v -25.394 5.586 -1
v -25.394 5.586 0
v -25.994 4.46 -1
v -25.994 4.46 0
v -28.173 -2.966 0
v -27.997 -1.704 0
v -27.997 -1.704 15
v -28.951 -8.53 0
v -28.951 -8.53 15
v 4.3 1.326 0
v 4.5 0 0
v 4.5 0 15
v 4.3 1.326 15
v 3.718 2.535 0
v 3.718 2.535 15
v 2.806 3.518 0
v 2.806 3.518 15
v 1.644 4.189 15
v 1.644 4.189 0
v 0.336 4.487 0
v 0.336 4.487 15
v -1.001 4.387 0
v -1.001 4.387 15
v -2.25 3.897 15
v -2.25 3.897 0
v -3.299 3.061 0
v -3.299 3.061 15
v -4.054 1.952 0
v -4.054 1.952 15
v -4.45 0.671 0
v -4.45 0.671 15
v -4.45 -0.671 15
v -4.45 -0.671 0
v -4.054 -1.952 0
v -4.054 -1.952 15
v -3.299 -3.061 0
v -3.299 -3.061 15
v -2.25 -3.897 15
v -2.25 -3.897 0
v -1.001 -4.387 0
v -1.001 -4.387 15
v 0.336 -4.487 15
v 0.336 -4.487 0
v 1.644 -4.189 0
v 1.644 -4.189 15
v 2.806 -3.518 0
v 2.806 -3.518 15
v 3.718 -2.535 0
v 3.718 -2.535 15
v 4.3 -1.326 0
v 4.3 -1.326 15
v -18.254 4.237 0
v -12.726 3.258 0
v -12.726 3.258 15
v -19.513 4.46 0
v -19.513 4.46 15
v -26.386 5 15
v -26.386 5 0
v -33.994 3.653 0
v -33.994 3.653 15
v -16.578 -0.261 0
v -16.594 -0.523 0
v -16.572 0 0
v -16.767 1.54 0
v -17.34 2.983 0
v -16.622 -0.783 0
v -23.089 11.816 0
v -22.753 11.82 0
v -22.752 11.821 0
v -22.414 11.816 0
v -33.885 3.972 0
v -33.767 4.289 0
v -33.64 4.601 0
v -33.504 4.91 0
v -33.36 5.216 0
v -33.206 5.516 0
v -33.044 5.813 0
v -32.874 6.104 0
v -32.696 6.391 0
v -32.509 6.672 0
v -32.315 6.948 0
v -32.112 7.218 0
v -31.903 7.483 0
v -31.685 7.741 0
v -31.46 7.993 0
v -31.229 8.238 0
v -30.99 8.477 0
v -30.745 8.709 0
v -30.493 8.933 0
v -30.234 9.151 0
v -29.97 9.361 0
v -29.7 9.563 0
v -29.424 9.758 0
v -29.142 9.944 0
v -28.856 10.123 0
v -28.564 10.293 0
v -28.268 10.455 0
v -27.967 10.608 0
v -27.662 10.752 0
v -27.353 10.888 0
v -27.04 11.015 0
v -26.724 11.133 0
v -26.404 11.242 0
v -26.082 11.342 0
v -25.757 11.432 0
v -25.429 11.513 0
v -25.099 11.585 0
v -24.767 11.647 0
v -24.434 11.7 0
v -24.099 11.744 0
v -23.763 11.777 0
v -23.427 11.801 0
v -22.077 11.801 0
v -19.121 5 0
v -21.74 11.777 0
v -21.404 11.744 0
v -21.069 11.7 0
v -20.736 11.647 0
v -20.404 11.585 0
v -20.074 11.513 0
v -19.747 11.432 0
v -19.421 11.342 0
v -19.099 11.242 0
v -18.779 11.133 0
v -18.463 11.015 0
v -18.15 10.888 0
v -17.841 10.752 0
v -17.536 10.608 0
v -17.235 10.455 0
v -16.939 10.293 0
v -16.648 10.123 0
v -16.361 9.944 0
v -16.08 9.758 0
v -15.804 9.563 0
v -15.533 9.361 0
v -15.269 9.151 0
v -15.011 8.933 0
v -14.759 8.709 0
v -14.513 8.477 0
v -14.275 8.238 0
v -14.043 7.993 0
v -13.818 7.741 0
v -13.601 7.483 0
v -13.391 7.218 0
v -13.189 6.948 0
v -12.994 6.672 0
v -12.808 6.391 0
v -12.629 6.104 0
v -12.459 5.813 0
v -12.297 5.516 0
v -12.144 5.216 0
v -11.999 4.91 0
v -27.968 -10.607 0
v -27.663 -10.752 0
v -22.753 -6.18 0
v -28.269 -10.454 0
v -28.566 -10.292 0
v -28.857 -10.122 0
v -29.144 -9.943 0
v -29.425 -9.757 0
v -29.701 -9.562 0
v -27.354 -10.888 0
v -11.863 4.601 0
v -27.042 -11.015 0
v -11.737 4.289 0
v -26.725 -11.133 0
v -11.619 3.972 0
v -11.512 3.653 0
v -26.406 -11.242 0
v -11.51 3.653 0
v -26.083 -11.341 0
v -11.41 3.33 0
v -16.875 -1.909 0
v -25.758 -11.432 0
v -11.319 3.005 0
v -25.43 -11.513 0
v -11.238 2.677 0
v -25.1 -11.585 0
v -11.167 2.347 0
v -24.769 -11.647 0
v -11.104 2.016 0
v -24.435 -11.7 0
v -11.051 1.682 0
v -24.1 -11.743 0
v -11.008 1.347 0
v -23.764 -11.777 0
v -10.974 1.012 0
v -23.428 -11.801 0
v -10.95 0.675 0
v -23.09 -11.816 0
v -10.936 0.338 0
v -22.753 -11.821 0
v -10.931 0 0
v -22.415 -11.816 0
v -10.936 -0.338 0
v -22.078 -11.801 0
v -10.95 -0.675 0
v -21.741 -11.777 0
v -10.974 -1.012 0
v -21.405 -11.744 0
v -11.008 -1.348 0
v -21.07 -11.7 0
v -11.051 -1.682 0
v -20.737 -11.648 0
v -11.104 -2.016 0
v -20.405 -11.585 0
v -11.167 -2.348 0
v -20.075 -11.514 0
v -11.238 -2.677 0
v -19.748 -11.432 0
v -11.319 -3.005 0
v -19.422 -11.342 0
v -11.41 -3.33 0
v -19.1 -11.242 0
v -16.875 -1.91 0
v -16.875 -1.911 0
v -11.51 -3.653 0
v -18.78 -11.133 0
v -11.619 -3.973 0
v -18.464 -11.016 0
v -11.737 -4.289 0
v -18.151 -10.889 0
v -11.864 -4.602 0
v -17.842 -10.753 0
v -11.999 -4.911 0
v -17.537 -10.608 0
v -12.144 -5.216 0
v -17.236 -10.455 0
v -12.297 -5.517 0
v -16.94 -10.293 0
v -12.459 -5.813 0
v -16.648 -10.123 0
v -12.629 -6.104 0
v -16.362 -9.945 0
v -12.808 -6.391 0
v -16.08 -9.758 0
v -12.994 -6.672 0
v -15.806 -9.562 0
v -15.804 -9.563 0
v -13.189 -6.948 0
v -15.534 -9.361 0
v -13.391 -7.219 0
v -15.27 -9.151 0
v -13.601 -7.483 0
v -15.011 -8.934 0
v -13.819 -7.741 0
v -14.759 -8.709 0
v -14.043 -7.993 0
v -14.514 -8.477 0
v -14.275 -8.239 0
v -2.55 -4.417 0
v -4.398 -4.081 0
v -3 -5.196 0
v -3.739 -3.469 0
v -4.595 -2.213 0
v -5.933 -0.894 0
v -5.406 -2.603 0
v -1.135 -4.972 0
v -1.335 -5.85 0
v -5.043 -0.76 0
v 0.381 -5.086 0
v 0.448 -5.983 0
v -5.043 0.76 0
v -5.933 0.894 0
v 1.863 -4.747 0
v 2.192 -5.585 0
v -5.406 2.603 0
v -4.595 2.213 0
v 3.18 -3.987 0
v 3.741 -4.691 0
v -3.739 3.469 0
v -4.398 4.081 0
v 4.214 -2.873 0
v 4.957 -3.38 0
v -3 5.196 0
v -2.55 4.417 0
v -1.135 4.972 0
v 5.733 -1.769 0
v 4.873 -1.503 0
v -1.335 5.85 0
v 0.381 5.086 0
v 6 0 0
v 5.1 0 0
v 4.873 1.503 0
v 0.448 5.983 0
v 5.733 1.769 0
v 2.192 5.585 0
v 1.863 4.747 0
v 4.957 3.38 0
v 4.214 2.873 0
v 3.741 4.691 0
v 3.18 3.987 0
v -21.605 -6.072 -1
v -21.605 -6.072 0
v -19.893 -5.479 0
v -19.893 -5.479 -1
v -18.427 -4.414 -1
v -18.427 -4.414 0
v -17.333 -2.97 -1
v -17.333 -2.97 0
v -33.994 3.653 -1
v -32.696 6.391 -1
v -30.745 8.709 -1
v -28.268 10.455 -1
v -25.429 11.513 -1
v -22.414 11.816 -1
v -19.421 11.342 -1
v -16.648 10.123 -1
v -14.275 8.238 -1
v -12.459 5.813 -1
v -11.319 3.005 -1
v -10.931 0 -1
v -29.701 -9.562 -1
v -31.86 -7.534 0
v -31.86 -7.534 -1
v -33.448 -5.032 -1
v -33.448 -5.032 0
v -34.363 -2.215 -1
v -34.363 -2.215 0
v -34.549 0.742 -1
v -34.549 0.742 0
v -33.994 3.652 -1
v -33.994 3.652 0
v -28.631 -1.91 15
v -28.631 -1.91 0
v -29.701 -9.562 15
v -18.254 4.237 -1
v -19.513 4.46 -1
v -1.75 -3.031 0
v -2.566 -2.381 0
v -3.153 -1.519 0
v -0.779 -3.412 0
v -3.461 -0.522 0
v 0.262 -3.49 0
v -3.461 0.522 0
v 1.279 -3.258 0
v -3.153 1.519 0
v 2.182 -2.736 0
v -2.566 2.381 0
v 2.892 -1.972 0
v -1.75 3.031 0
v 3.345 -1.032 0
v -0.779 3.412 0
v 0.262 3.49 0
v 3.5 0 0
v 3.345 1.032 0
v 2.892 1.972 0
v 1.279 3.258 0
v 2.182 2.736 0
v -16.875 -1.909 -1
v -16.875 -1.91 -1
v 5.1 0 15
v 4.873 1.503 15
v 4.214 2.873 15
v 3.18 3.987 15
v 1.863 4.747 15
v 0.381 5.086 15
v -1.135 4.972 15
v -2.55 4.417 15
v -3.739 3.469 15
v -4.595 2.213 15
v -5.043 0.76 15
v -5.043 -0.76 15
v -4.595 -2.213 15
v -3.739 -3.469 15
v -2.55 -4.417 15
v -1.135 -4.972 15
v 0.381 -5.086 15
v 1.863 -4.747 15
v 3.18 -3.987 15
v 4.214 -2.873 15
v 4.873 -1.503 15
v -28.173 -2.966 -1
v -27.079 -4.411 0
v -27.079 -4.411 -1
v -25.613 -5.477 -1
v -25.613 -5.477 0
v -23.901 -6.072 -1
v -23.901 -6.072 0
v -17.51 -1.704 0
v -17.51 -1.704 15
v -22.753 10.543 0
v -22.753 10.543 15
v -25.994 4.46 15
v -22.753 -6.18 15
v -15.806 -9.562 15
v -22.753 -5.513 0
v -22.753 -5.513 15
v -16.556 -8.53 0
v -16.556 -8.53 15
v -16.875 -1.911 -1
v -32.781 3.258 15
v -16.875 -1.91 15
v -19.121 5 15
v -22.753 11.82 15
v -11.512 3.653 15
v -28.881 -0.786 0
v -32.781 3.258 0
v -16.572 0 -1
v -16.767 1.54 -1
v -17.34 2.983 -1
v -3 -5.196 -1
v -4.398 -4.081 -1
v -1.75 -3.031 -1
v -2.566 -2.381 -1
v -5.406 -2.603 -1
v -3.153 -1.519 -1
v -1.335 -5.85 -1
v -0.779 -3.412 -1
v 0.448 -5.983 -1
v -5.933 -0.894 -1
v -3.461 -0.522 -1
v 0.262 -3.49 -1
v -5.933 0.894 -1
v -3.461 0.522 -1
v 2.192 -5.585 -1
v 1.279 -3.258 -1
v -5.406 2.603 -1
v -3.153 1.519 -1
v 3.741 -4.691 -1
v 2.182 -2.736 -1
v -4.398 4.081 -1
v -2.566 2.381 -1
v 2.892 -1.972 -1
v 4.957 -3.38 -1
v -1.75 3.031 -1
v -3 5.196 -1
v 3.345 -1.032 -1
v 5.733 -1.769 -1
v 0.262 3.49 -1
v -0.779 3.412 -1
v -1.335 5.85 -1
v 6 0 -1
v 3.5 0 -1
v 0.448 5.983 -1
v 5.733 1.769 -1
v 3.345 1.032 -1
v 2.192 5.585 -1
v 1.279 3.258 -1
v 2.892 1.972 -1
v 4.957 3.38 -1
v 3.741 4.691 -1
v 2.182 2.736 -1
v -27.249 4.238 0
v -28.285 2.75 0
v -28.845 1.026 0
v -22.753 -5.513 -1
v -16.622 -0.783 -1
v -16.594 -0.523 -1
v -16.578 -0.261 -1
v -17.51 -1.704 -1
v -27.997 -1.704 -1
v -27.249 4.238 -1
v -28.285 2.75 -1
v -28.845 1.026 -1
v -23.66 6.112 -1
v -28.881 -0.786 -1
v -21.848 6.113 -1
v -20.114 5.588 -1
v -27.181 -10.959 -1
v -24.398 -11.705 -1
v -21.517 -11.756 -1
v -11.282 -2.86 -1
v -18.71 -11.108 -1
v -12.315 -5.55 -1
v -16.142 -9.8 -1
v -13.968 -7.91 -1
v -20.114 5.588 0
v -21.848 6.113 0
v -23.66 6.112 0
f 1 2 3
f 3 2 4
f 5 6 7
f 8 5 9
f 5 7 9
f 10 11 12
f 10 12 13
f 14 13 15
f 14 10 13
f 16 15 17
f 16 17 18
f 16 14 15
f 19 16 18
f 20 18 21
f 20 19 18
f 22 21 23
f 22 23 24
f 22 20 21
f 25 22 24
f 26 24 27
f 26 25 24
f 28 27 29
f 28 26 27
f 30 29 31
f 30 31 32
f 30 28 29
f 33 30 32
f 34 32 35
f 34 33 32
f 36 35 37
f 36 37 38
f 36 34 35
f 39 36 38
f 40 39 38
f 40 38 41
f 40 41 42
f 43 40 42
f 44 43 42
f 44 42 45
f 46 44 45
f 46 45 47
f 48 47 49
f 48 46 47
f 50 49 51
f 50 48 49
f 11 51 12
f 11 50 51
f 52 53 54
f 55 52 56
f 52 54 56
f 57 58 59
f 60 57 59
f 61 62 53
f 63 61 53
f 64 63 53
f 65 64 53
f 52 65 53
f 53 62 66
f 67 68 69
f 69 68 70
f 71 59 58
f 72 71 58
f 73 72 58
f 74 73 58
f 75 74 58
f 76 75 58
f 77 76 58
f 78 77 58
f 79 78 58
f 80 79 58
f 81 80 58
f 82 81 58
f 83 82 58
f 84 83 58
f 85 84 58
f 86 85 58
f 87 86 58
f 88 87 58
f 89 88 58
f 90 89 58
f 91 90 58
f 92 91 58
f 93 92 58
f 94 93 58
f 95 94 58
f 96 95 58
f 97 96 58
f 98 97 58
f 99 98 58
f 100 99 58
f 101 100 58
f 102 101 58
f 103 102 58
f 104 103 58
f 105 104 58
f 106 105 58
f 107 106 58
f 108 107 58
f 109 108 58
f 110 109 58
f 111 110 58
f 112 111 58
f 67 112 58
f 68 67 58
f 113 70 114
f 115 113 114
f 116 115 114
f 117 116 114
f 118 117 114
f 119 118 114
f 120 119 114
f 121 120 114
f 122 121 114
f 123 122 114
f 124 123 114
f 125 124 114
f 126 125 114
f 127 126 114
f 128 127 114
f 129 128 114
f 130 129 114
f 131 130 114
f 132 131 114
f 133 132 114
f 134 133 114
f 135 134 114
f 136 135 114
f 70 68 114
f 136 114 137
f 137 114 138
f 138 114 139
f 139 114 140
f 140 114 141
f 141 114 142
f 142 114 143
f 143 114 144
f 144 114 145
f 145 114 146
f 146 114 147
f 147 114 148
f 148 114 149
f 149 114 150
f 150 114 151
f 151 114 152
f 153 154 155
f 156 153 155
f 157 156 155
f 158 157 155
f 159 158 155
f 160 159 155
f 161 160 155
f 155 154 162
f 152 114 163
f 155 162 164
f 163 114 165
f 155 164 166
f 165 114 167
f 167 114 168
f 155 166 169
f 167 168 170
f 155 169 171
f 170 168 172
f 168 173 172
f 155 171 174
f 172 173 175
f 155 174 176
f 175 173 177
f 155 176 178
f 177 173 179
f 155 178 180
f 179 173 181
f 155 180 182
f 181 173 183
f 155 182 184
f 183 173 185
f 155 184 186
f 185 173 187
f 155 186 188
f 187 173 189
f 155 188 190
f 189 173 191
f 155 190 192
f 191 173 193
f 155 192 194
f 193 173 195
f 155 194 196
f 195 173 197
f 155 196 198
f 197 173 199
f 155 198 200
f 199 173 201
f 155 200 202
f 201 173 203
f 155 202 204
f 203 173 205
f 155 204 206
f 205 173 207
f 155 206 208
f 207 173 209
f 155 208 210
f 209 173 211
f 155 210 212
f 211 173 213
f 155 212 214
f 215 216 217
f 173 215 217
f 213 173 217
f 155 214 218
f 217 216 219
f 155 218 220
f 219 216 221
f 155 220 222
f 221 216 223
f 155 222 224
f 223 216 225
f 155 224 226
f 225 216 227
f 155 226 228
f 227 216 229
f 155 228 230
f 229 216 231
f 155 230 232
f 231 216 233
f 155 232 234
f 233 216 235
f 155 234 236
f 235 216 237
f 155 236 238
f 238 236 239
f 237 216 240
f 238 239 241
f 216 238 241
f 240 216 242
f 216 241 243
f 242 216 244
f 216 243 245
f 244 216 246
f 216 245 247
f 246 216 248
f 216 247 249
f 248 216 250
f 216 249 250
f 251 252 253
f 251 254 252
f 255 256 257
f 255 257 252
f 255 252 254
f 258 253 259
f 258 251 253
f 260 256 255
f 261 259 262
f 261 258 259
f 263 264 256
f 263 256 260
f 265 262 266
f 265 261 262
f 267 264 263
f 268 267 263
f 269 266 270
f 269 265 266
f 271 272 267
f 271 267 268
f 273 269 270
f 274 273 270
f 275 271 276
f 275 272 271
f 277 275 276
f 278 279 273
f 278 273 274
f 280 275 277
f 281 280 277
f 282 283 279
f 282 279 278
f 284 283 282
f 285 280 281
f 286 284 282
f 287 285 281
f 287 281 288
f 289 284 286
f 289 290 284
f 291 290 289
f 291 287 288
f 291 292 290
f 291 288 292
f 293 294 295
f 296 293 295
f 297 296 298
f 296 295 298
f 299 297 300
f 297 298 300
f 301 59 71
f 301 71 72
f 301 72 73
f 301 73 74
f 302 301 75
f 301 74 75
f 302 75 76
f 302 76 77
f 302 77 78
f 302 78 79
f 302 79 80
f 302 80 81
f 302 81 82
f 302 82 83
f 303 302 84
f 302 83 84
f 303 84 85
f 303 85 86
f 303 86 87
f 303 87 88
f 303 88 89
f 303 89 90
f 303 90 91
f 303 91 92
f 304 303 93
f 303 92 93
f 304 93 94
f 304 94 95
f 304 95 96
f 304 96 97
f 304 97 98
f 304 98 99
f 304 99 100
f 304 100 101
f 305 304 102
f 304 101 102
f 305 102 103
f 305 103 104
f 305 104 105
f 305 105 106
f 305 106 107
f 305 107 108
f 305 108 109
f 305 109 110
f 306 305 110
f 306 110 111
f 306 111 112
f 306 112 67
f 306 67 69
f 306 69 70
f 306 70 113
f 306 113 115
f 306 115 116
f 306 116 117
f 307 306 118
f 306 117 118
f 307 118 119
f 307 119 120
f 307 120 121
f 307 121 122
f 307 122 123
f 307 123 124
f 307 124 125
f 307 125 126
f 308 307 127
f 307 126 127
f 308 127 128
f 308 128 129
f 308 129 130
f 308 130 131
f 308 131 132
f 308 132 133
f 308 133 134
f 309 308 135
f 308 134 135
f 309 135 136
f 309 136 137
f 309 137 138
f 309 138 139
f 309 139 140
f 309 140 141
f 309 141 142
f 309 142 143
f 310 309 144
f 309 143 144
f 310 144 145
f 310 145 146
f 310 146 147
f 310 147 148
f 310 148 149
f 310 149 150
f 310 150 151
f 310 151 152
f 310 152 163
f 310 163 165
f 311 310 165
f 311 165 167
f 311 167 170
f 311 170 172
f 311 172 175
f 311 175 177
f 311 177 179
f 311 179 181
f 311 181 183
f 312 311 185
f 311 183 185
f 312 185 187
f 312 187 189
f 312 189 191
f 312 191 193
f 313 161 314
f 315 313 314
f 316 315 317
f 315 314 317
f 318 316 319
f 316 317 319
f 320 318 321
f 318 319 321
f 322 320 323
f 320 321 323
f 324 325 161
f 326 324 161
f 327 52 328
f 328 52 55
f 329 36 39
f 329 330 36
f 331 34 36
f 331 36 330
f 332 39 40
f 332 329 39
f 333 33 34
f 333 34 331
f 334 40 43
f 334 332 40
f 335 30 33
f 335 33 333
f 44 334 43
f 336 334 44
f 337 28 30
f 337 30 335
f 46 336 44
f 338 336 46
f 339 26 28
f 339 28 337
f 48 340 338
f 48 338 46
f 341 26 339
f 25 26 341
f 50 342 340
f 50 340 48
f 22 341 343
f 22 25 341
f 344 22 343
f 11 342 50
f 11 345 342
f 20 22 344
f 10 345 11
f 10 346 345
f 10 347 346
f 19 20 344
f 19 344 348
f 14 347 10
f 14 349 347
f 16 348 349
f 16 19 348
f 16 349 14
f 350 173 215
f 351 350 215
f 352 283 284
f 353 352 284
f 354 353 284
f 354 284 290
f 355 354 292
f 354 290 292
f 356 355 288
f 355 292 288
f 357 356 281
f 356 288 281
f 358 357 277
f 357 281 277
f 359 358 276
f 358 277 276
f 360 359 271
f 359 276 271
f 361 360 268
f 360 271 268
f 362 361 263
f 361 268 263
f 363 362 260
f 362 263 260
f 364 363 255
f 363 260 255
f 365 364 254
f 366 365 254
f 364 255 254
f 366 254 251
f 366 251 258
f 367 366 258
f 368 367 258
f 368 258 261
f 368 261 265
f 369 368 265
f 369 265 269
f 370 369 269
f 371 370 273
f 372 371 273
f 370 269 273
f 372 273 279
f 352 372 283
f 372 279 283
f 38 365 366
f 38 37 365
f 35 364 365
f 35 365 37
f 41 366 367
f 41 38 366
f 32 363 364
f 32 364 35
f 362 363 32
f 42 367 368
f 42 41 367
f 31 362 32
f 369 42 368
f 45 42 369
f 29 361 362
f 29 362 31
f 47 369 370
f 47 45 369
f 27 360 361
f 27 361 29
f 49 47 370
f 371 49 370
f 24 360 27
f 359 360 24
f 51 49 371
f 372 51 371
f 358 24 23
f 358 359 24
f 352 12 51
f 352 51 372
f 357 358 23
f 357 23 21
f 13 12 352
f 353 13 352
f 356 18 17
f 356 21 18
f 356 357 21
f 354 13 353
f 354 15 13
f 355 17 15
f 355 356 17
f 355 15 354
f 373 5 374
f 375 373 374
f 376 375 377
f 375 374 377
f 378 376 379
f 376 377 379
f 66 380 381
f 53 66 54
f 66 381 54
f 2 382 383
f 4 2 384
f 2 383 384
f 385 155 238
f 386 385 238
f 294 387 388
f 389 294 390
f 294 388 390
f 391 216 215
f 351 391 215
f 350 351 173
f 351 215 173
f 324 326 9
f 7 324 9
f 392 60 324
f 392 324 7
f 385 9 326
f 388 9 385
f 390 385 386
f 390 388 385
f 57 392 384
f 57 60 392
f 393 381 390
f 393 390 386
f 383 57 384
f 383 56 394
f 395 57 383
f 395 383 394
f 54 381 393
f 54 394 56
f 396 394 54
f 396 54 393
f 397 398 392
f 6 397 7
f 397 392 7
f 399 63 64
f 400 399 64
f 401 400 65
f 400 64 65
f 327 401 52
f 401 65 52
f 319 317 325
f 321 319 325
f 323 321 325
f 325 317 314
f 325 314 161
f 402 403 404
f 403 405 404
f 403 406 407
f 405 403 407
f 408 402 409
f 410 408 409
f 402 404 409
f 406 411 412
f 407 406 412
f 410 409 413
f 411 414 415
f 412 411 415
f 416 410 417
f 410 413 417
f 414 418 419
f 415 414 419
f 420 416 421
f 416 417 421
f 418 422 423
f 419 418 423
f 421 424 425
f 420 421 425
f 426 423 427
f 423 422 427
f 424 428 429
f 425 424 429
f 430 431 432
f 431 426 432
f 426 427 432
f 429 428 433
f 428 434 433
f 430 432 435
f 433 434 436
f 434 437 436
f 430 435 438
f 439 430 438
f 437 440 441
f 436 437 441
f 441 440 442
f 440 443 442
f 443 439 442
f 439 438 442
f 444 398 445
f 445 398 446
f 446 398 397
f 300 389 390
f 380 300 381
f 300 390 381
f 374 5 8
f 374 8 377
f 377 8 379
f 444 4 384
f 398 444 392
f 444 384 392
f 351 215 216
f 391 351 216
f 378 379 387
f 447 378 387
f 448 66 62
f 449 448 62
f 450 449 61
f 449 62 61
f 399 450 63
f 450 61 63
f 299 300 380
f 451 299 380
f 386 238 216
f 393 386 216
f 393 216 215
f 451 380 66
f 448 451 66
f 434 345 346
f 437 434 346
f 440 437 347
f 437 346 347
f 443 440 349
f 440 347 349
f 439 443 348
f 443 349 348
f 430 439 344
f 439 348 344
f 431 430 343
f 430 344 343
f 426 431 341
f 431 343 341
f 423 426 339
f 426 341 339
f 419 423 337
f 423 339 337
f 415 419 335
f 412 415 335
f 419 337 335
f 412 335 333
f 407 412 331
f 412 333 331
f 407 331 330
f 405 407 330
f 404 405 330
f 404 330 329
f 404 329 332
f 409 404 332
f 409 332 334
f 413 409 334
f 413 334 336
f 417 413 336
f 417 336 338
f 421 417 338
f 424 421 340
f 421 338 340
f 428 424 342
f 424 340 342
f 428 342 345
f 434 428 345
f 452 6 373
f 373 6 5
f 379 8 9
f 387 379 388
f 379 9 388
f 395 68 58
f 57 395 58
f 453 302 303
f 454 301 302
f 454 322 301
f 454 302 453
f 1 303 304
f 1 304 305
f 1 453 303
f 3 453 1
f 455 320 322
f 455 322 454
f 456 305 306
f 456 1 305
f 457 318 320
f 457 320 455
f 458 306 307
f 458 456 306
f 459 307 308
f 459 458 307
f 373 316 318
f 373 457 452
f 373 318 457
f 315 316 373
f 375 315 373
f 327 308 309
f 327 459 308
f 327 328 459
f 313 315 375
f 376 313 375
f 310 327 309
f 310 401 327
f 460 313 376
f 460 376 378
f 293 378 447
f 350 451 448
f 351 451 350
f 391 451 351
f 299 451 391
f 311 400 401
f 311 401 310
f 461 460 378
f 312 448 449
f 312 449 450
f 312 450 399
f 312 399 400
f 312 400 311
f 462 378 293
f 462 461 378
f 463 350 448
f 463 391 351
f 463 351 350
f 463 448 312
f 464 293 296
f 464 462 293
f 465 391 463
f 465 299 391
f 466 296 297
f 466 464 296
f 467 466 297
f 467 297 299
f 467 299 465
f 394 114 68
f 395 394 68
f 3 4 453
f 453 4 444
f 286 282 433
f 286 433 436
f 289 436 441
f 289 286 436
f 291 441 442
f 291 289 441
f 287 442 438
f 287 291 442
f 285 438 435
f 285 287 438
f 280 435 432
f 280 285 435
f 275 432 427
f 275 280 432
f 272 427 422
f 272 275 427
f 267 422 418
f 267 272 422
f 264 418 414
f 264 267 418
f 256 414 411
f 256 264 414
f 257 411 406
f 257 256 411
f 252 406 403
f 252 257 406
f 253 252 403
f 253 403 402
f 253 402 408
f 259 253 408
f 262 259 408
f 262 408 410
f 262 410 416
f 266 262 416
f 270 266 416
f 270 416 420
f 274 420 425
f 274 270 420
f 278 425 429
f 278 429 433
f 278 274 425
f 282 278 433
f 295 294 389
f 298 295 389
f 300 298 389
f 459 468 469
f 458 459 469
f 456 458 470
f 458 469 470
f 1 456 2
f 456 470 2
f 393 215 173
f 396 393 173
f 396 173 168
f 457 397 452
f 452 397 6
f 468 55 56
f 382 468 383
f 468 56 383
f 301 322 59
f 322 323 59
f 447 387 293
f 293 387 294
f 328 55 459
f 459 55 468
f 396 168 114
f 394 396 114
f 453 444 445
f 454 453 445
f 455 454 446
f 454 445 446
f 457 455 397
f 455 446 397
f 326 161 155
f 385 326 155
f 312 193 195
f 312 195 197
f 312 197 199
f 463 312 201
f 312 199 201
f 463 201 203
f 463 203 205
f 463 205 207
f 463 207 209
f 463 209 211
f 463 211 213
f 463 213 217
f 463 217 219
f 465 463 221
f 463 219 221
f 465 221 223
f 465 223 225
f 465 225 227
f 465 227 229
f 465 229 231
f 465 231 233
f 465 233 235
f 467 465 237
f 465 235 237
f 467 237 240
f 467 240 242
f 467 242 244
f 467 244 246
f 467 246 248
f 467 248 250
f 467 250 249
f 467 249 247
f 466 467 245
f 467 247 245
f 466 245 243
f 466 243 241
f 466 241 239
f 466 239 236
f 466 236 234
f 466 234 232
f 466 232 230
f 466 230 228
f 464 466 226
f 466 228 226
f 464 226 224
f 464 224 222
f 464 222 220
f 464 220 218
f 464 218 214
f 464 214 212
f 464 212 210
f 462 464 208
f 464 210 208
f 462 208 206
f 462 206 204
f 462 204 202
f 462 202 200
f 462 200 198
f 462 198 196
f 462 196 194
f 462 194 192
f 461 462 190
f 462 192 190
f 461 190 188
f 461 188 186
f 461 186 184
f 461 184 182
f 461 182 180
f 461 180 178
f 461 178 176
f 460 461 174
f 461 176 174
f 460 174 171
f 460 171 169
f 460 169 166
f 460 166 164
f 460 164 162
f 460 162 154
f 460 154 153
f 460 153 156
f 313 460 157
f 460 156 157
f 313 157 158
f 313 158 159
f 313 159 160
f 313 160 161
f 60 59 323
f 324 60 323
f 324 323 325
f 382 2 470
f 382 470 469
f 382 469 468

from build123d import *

# Parameters (mm, degrees)
F0_R     = 5.1
F0_R_2   = 4.5
F1_DEPTH = 15
F0_R_3   = 6
F0_R_4   = 3.5
F2_DEPTH = 1
F4_DEPTH = 15
F5_T     = -0.6
F6_DEPTH = 25
F8_DEPTH = 1


# Not quite as in the source:
# - a feature names something its author has since deleted; it is built from what else it names


with BuildPart() as f1:
    # F0 (on Top) → F1 (new body)
    with BuildSketch(Plane.XY):
        Circle(F0_R)
        Circle(F0_R_2, mode=Mode.SUBTRACT)
    extrude(amount=F1_DEPTH)

    # F0 (on Top) → F2 (join)
    with BuildSketch(Plane.XY):
        Circle(F0_R_3)
        Circle(F0_R, mode=Mode.SUBTRACT)
        Circle(F0_R)
        Circle(F0_R_2, mode=Mode.SUBTRACT)
        Circle(F0_R_2)
        Circle(F0_R_4, mode=Mode.SUBTRACT)
    extrude(amount=-F2_DEPTH)


with BuildPart() as f4:
    # F3 (on Top) → F4 (new body)
    with BuildSketch(Plane.XY):
        Polygon((-22.7533387916, 11.8196601125), (-26.3860514316, 5), (-19.1206261516, 5), align=None)
        Polygon((-19.1206261516, 5), (-26.3860514316, 5), (-28.6311913145, -1.9098300563), (-22.7533387916, -6.1803398875), (-16.8754862687, -1.9098300563), align=None)
        Polygon((-28.6311913145, -1.9098300563), (-26.3860514316, 5), (-33.9944407131, 3.6526692678), align=None)
        Polygon((-11.5122368701, 3.6526692679), (-19.1206261516, 5), (-16.8754862687, -1.9098300563), align=None)
        Polygon((-22.7533387916, -6.1803398875), (-28.6311913145, -1.9098300563), (-29.7009252298, -9.5621863542), align=None)
        Polygon((-15.8057523534, -9.5621863542), (-16.8754862687, -1.9098300563), (-22.7533387916, -6.1803398875), align=None)
    extrude(amount=F4_DEPTH)

    # F5
    f5_openings = [f4.faces().sort_by_distance(p)[0] for p in [
        (-22.753339, 2.4e-05, 15),
    ]]
    offset(amount=F5_T, openings=f5_openings, kind=Kind.INTERSECTION)

    # F6 (cut): a face of the model
    f6_faces = [f4.faces().sort_by_distance(p)[0] for p in [
        (-22.7533387916, 1.8747e-05, 0.6),
    ]]
    extrude(f6_faces, amount=-F6_DEPTH, mode=Mode.SUBTRACT)

    # F7 (on face) → F8 (join)
    with BuildSketch(Plane(origin=(0, 0, 0), x_dir=(1, 0, 0), z_dir=(0, 0, -1))):
        with BuildLine():
            ThreePointArc((-33.9937850005, -3.6527853846), (-20.9025615121, -11.6750787208), (-10.931109278, 0))
            ThreePointArc((-10.931109278, 0), (-17.3859492082, 10.5325851378), (-29.7009252298, 9.5621863542))
            Line((-29.7009252298, 9.5621863542), (-22.7533387916, 6.1803398875))
            Line((-22.7533387916, 6.1803398875), (-15.8057523534, 9.5621863542))
            Line((-15.8057523534, 9.5621863542), (-16.8753003708, 1.9111598792))
            ThreePointArc((-16.8753003708, 1.9111598792), (-16.8749270082, 1.9100114851), (-16.87455387, 1.9088630181))
            Line((-16.87455387, 1.9088630181), (-11.5122368701, -3.6526692679))
            Line((-11.5122368701, -3.6526692679), (-19.1206261516, -5))
            Line((-19.1206261516, -5), (-22.7533387916, -11.8196601125))
            Line((-22.7533387916, -11.8196601125), (-26.3860514316, -5))
            Line((-26.3860514316, -5), (-33.9937850005, -3.6527853846))
        make_face()
        with BuildLine():
            Line((-28.6311913145, 1.9098300563), (-29.7009252298, 9.5621863542))
            ThreePointArc((-29.7009252298, 9.5621863542), (-33.9939295406, 3.6523405078), (-33.9939784806, -3.652189863))
            Line((-33.9939784806, -3.652189863), (-28.6311913145, 1.9098300563))
        make_face()
        with BuildLine():
            Line((-22.7533387916, 6.1803398875), (-29.7009252298, 9.5621863542))
            Line((-29.7009252298, 9.5621863542), (-28.6311913145, 1.9098300563))
            Line((-28.6311913145, 1.9098300563), (-33.9939784806, -3.652189863))
            ThreePointArc((-33.9939784806, -3.652189863), (-33.9938817445, -3.6524876251), (-33.9937850005, -3.6527853846))
            Line((-33.9937850005, -3.6527853846), (-26.3860514316, -5))
            Line((-26.3860514316, -5), (-22.7533387916, -11.8196601125))
            Line((-22.7533387916, -11.8196601125), (-19.1206261516, -5))
            ThreePointArc((-19.1206261516, -5), (-19.6033787354, -5.3172164164), (-20.1136429421, -5.587968612))
            Line((-20.1136429421, -5.587968612), (-22.7533387916, -10.5434468668))
            Line((-22.7533387916, -10.5434468668), (-25.3941234048, -5.5859246852))
            ThreePointArc((-25.3941234048, -5.5859246852), (-26.3846353663, -4.9986775768), (-27.2489939544, -4.2378508268))
            Line((-27.2489939544, -4.2378508268), (-32.780698951, -3.25826949))
            Line((-32.780698951, -3.25826949), (-28.8808590942, 0.7864532062))
            ThreePointArc((-28.8808590942, 0.7864532062), (-28.6287938191, 1.9091510398), (-28.1729521499, 2.9656526731))
            Line((-28.1729521499, 2.9656526731), (-28.9507619198, 8.5297255762))
            Line((-28.9507619198, 8.5297255762), (-23.9008499041, 6.0716018437))
            ThreePointArc((-23.9008499041, 6.0716018437), (-22.7529067543, 6.1793887762), (-21.6049223097, 6.0720425464))
            Line((-21.6049223097, 6.0720425464), (-16.5559156634, 8.5297255762))
            Line((-16.5559156634, 8.5297255762), (-17.333067283, 2.9703607601))
            ThreePointArc((-17.333067283, 2.9703607601), (-17.0794064137, 2.4514686566), (-16.8753003708, 1.9111598792))
            Line((-16.8753003708, 1.9111598792), (-15.8057523534, 9.5621863542))
            Line((-15.8057523534, 9.5621863542), (-22.7533387916, 6.1803398875))
        make_face()
        with BuildLine():
            Line((-16.8754862687, 1.9098300563), (-16.8753003708, 1.9111598792))
            ThreePointArc((-16.8753003708, 1.9111598792), (-17.0794064137, 2.4514686566), (-17.333067283, 2.9703607601))
            Line((-17.333067283, 2.9703607601), (-17.5101449471, 1.7036332513))
            Line((-17.5101449471, 1.7036332513), (-16.6220867723, 0.7825828526))
            ThreePointArc((-16.6220867723, 0.7825828526), (-16.7219659069, 1.351630544), (-16.87455387, 1.9088630181))
            Line((-16.87455387, 1.9088630181), (-16.8754862687, 1.9098300563))
        make_face()
        with BuildLine():
            ThreePointArc((-20.1136429421, -5.587968612), (-19.6033787354, -5.3172164164), (-19.1206261516, -5))
            ThreePointArc((-19.1206261516, -5), (-18.6693555038, -4.6388729337), (-18.2537991943, -4.2371629522))
            Line((-18.2537991943, -4.2371629522), (-19.5128597724, -4.4601235484))
            Line((-19.5128597724, -4.4601235484), (-20.1136429421, -5.587968612))
        make_face()
        with BuildLine():
            ThreePointArc((-18.2537991943, -4.2371629522), (-18.6693555038, -4.6388729337), (-19.1206261516, -5))
            Line((-19.1206261516, -5), (-11.5122368701, -3.6526692679))
            Line((-11.5122368701, -3.6526692679), (-16.87455387, 1.9088630181))
            ThreePointArc((-16.87455387, 1.9088630181), (-16.7219659069, 1.351630544), (-16.6220867723, 0.7825828526))
            Line((-16.6220867723, 0.7825828526), (-12.7259786322, -3.2582694901))
            Line((-12.7259786322, -3.2582694901), (-18.2537991943, -4.2371629522))
        make_face()
        with BuildLine():
            ThreePointArc((-21.6049223097, 6.0720425464), (-19.1211013467, 5.0003450612), (-17.333067283, 2.9703607601))
            Line((-17.333067283, 2.9703607601), (-16.5559156634, 8.5297255762))
            Line((-16.5559156634, 8.5297255762), (-21.6049223097, 6.0720425464))
        make_face()
        with BuildLine():
            Line((-22.7533387916, -10.5434468668), (-20.1136429421, -5.587968612))
            ThreePointArc((-20.1136429421, -5.587968612), (-22.7541124911, -6.1793884271), (-25.3941234048, -5.5859246852))
            Line((-25.3941234048, -5.5859246852), (-22.7533387916, -10.5434468668))
        make_face()
        with BuildLine():
            ThreePointArc((-16.5723317321, 0), (-17.0080609546, -2.2793026735), (-18.2537991943, -4.2371629522))
            Line((-18.2537991943, -4.2371629522), (-12.7259786322, -3.2582694901))
            Line((-12.7259786322, -3.2582694901), (-16.6220867723, 0.7825828526))
            ThreePointArc((-16.6220867723, 0.7825828526), (-16.5847830367, 0.39208146), (-16.5723317321, 0))
        make_face()
        with BuildLine():
            Line((-22.7533387916, 5.5130328448), (-21.6049223097, 6.0720425464))
            ThreePointArc((-21.6049223097, 6.0720425464), (-22.7529067543, 6.1793887762), (-23.9008499041, 6.0716018437))
            Line((-23.9008499041, 6.0716018437), (-22.7533387916, 5.5130328448))
        make_face()
        with BuildLine():
            ThreePointArc((-27.2489939544, -4.2378508268), (-26.3846353663, -4.9986775768), (-25.3941234048, -5.5859246852))
            Line((-25.3941234048, -5.5859246852), (-25.9938178107, -4.4601235484))
            Line((-25.9938178107, -4.4601235484), (-27.2489939544, -4.2378508268))
        make_face()
        with BuildLine():
            ThreePointArc((-28.1729521499, 2.9656526731), (-26.3854708, 4.9980702976), (-23.9008499041, 6.0716018437))
            Line((-23.9008499041, 6.0716018437), (-28.9507619198, 8.5297255762))
            Line((-28.9507619198, 8.5297255762), (-28.1729521499, 2.9656526731))
        make_face()
        with BuildLine():
            Line((-32.780698951, -3.25826949), (-27.2489939544, -4.2378508268))
            ThreePointArc((-27.2489939544, -4.2378508268), (-28.6288853053, -1.9088693886), (-28.8808590942, 0.7864532062))
            Line((-28.8808590942, 0.7864532062), (-32.780698951, -3.25826949))
        make_face()
        with BuildLine():
            Line((-27.9965326361, 1.7036332513), (-28.1729521499, 2.9656526731))
            ThreePointArc((-28.1729521499, 2.9656526731), (-28.6287938191, 1.9091510398), (-28.8808590942, 0.7864532062))
            Line((-28.8808590942, 0.7864532062), (-27.9965326361, 1.7036332513))
        make_face()
    extrude(amount=F8_DEPTH)


solid = Compound([f1.part, f4.part])
